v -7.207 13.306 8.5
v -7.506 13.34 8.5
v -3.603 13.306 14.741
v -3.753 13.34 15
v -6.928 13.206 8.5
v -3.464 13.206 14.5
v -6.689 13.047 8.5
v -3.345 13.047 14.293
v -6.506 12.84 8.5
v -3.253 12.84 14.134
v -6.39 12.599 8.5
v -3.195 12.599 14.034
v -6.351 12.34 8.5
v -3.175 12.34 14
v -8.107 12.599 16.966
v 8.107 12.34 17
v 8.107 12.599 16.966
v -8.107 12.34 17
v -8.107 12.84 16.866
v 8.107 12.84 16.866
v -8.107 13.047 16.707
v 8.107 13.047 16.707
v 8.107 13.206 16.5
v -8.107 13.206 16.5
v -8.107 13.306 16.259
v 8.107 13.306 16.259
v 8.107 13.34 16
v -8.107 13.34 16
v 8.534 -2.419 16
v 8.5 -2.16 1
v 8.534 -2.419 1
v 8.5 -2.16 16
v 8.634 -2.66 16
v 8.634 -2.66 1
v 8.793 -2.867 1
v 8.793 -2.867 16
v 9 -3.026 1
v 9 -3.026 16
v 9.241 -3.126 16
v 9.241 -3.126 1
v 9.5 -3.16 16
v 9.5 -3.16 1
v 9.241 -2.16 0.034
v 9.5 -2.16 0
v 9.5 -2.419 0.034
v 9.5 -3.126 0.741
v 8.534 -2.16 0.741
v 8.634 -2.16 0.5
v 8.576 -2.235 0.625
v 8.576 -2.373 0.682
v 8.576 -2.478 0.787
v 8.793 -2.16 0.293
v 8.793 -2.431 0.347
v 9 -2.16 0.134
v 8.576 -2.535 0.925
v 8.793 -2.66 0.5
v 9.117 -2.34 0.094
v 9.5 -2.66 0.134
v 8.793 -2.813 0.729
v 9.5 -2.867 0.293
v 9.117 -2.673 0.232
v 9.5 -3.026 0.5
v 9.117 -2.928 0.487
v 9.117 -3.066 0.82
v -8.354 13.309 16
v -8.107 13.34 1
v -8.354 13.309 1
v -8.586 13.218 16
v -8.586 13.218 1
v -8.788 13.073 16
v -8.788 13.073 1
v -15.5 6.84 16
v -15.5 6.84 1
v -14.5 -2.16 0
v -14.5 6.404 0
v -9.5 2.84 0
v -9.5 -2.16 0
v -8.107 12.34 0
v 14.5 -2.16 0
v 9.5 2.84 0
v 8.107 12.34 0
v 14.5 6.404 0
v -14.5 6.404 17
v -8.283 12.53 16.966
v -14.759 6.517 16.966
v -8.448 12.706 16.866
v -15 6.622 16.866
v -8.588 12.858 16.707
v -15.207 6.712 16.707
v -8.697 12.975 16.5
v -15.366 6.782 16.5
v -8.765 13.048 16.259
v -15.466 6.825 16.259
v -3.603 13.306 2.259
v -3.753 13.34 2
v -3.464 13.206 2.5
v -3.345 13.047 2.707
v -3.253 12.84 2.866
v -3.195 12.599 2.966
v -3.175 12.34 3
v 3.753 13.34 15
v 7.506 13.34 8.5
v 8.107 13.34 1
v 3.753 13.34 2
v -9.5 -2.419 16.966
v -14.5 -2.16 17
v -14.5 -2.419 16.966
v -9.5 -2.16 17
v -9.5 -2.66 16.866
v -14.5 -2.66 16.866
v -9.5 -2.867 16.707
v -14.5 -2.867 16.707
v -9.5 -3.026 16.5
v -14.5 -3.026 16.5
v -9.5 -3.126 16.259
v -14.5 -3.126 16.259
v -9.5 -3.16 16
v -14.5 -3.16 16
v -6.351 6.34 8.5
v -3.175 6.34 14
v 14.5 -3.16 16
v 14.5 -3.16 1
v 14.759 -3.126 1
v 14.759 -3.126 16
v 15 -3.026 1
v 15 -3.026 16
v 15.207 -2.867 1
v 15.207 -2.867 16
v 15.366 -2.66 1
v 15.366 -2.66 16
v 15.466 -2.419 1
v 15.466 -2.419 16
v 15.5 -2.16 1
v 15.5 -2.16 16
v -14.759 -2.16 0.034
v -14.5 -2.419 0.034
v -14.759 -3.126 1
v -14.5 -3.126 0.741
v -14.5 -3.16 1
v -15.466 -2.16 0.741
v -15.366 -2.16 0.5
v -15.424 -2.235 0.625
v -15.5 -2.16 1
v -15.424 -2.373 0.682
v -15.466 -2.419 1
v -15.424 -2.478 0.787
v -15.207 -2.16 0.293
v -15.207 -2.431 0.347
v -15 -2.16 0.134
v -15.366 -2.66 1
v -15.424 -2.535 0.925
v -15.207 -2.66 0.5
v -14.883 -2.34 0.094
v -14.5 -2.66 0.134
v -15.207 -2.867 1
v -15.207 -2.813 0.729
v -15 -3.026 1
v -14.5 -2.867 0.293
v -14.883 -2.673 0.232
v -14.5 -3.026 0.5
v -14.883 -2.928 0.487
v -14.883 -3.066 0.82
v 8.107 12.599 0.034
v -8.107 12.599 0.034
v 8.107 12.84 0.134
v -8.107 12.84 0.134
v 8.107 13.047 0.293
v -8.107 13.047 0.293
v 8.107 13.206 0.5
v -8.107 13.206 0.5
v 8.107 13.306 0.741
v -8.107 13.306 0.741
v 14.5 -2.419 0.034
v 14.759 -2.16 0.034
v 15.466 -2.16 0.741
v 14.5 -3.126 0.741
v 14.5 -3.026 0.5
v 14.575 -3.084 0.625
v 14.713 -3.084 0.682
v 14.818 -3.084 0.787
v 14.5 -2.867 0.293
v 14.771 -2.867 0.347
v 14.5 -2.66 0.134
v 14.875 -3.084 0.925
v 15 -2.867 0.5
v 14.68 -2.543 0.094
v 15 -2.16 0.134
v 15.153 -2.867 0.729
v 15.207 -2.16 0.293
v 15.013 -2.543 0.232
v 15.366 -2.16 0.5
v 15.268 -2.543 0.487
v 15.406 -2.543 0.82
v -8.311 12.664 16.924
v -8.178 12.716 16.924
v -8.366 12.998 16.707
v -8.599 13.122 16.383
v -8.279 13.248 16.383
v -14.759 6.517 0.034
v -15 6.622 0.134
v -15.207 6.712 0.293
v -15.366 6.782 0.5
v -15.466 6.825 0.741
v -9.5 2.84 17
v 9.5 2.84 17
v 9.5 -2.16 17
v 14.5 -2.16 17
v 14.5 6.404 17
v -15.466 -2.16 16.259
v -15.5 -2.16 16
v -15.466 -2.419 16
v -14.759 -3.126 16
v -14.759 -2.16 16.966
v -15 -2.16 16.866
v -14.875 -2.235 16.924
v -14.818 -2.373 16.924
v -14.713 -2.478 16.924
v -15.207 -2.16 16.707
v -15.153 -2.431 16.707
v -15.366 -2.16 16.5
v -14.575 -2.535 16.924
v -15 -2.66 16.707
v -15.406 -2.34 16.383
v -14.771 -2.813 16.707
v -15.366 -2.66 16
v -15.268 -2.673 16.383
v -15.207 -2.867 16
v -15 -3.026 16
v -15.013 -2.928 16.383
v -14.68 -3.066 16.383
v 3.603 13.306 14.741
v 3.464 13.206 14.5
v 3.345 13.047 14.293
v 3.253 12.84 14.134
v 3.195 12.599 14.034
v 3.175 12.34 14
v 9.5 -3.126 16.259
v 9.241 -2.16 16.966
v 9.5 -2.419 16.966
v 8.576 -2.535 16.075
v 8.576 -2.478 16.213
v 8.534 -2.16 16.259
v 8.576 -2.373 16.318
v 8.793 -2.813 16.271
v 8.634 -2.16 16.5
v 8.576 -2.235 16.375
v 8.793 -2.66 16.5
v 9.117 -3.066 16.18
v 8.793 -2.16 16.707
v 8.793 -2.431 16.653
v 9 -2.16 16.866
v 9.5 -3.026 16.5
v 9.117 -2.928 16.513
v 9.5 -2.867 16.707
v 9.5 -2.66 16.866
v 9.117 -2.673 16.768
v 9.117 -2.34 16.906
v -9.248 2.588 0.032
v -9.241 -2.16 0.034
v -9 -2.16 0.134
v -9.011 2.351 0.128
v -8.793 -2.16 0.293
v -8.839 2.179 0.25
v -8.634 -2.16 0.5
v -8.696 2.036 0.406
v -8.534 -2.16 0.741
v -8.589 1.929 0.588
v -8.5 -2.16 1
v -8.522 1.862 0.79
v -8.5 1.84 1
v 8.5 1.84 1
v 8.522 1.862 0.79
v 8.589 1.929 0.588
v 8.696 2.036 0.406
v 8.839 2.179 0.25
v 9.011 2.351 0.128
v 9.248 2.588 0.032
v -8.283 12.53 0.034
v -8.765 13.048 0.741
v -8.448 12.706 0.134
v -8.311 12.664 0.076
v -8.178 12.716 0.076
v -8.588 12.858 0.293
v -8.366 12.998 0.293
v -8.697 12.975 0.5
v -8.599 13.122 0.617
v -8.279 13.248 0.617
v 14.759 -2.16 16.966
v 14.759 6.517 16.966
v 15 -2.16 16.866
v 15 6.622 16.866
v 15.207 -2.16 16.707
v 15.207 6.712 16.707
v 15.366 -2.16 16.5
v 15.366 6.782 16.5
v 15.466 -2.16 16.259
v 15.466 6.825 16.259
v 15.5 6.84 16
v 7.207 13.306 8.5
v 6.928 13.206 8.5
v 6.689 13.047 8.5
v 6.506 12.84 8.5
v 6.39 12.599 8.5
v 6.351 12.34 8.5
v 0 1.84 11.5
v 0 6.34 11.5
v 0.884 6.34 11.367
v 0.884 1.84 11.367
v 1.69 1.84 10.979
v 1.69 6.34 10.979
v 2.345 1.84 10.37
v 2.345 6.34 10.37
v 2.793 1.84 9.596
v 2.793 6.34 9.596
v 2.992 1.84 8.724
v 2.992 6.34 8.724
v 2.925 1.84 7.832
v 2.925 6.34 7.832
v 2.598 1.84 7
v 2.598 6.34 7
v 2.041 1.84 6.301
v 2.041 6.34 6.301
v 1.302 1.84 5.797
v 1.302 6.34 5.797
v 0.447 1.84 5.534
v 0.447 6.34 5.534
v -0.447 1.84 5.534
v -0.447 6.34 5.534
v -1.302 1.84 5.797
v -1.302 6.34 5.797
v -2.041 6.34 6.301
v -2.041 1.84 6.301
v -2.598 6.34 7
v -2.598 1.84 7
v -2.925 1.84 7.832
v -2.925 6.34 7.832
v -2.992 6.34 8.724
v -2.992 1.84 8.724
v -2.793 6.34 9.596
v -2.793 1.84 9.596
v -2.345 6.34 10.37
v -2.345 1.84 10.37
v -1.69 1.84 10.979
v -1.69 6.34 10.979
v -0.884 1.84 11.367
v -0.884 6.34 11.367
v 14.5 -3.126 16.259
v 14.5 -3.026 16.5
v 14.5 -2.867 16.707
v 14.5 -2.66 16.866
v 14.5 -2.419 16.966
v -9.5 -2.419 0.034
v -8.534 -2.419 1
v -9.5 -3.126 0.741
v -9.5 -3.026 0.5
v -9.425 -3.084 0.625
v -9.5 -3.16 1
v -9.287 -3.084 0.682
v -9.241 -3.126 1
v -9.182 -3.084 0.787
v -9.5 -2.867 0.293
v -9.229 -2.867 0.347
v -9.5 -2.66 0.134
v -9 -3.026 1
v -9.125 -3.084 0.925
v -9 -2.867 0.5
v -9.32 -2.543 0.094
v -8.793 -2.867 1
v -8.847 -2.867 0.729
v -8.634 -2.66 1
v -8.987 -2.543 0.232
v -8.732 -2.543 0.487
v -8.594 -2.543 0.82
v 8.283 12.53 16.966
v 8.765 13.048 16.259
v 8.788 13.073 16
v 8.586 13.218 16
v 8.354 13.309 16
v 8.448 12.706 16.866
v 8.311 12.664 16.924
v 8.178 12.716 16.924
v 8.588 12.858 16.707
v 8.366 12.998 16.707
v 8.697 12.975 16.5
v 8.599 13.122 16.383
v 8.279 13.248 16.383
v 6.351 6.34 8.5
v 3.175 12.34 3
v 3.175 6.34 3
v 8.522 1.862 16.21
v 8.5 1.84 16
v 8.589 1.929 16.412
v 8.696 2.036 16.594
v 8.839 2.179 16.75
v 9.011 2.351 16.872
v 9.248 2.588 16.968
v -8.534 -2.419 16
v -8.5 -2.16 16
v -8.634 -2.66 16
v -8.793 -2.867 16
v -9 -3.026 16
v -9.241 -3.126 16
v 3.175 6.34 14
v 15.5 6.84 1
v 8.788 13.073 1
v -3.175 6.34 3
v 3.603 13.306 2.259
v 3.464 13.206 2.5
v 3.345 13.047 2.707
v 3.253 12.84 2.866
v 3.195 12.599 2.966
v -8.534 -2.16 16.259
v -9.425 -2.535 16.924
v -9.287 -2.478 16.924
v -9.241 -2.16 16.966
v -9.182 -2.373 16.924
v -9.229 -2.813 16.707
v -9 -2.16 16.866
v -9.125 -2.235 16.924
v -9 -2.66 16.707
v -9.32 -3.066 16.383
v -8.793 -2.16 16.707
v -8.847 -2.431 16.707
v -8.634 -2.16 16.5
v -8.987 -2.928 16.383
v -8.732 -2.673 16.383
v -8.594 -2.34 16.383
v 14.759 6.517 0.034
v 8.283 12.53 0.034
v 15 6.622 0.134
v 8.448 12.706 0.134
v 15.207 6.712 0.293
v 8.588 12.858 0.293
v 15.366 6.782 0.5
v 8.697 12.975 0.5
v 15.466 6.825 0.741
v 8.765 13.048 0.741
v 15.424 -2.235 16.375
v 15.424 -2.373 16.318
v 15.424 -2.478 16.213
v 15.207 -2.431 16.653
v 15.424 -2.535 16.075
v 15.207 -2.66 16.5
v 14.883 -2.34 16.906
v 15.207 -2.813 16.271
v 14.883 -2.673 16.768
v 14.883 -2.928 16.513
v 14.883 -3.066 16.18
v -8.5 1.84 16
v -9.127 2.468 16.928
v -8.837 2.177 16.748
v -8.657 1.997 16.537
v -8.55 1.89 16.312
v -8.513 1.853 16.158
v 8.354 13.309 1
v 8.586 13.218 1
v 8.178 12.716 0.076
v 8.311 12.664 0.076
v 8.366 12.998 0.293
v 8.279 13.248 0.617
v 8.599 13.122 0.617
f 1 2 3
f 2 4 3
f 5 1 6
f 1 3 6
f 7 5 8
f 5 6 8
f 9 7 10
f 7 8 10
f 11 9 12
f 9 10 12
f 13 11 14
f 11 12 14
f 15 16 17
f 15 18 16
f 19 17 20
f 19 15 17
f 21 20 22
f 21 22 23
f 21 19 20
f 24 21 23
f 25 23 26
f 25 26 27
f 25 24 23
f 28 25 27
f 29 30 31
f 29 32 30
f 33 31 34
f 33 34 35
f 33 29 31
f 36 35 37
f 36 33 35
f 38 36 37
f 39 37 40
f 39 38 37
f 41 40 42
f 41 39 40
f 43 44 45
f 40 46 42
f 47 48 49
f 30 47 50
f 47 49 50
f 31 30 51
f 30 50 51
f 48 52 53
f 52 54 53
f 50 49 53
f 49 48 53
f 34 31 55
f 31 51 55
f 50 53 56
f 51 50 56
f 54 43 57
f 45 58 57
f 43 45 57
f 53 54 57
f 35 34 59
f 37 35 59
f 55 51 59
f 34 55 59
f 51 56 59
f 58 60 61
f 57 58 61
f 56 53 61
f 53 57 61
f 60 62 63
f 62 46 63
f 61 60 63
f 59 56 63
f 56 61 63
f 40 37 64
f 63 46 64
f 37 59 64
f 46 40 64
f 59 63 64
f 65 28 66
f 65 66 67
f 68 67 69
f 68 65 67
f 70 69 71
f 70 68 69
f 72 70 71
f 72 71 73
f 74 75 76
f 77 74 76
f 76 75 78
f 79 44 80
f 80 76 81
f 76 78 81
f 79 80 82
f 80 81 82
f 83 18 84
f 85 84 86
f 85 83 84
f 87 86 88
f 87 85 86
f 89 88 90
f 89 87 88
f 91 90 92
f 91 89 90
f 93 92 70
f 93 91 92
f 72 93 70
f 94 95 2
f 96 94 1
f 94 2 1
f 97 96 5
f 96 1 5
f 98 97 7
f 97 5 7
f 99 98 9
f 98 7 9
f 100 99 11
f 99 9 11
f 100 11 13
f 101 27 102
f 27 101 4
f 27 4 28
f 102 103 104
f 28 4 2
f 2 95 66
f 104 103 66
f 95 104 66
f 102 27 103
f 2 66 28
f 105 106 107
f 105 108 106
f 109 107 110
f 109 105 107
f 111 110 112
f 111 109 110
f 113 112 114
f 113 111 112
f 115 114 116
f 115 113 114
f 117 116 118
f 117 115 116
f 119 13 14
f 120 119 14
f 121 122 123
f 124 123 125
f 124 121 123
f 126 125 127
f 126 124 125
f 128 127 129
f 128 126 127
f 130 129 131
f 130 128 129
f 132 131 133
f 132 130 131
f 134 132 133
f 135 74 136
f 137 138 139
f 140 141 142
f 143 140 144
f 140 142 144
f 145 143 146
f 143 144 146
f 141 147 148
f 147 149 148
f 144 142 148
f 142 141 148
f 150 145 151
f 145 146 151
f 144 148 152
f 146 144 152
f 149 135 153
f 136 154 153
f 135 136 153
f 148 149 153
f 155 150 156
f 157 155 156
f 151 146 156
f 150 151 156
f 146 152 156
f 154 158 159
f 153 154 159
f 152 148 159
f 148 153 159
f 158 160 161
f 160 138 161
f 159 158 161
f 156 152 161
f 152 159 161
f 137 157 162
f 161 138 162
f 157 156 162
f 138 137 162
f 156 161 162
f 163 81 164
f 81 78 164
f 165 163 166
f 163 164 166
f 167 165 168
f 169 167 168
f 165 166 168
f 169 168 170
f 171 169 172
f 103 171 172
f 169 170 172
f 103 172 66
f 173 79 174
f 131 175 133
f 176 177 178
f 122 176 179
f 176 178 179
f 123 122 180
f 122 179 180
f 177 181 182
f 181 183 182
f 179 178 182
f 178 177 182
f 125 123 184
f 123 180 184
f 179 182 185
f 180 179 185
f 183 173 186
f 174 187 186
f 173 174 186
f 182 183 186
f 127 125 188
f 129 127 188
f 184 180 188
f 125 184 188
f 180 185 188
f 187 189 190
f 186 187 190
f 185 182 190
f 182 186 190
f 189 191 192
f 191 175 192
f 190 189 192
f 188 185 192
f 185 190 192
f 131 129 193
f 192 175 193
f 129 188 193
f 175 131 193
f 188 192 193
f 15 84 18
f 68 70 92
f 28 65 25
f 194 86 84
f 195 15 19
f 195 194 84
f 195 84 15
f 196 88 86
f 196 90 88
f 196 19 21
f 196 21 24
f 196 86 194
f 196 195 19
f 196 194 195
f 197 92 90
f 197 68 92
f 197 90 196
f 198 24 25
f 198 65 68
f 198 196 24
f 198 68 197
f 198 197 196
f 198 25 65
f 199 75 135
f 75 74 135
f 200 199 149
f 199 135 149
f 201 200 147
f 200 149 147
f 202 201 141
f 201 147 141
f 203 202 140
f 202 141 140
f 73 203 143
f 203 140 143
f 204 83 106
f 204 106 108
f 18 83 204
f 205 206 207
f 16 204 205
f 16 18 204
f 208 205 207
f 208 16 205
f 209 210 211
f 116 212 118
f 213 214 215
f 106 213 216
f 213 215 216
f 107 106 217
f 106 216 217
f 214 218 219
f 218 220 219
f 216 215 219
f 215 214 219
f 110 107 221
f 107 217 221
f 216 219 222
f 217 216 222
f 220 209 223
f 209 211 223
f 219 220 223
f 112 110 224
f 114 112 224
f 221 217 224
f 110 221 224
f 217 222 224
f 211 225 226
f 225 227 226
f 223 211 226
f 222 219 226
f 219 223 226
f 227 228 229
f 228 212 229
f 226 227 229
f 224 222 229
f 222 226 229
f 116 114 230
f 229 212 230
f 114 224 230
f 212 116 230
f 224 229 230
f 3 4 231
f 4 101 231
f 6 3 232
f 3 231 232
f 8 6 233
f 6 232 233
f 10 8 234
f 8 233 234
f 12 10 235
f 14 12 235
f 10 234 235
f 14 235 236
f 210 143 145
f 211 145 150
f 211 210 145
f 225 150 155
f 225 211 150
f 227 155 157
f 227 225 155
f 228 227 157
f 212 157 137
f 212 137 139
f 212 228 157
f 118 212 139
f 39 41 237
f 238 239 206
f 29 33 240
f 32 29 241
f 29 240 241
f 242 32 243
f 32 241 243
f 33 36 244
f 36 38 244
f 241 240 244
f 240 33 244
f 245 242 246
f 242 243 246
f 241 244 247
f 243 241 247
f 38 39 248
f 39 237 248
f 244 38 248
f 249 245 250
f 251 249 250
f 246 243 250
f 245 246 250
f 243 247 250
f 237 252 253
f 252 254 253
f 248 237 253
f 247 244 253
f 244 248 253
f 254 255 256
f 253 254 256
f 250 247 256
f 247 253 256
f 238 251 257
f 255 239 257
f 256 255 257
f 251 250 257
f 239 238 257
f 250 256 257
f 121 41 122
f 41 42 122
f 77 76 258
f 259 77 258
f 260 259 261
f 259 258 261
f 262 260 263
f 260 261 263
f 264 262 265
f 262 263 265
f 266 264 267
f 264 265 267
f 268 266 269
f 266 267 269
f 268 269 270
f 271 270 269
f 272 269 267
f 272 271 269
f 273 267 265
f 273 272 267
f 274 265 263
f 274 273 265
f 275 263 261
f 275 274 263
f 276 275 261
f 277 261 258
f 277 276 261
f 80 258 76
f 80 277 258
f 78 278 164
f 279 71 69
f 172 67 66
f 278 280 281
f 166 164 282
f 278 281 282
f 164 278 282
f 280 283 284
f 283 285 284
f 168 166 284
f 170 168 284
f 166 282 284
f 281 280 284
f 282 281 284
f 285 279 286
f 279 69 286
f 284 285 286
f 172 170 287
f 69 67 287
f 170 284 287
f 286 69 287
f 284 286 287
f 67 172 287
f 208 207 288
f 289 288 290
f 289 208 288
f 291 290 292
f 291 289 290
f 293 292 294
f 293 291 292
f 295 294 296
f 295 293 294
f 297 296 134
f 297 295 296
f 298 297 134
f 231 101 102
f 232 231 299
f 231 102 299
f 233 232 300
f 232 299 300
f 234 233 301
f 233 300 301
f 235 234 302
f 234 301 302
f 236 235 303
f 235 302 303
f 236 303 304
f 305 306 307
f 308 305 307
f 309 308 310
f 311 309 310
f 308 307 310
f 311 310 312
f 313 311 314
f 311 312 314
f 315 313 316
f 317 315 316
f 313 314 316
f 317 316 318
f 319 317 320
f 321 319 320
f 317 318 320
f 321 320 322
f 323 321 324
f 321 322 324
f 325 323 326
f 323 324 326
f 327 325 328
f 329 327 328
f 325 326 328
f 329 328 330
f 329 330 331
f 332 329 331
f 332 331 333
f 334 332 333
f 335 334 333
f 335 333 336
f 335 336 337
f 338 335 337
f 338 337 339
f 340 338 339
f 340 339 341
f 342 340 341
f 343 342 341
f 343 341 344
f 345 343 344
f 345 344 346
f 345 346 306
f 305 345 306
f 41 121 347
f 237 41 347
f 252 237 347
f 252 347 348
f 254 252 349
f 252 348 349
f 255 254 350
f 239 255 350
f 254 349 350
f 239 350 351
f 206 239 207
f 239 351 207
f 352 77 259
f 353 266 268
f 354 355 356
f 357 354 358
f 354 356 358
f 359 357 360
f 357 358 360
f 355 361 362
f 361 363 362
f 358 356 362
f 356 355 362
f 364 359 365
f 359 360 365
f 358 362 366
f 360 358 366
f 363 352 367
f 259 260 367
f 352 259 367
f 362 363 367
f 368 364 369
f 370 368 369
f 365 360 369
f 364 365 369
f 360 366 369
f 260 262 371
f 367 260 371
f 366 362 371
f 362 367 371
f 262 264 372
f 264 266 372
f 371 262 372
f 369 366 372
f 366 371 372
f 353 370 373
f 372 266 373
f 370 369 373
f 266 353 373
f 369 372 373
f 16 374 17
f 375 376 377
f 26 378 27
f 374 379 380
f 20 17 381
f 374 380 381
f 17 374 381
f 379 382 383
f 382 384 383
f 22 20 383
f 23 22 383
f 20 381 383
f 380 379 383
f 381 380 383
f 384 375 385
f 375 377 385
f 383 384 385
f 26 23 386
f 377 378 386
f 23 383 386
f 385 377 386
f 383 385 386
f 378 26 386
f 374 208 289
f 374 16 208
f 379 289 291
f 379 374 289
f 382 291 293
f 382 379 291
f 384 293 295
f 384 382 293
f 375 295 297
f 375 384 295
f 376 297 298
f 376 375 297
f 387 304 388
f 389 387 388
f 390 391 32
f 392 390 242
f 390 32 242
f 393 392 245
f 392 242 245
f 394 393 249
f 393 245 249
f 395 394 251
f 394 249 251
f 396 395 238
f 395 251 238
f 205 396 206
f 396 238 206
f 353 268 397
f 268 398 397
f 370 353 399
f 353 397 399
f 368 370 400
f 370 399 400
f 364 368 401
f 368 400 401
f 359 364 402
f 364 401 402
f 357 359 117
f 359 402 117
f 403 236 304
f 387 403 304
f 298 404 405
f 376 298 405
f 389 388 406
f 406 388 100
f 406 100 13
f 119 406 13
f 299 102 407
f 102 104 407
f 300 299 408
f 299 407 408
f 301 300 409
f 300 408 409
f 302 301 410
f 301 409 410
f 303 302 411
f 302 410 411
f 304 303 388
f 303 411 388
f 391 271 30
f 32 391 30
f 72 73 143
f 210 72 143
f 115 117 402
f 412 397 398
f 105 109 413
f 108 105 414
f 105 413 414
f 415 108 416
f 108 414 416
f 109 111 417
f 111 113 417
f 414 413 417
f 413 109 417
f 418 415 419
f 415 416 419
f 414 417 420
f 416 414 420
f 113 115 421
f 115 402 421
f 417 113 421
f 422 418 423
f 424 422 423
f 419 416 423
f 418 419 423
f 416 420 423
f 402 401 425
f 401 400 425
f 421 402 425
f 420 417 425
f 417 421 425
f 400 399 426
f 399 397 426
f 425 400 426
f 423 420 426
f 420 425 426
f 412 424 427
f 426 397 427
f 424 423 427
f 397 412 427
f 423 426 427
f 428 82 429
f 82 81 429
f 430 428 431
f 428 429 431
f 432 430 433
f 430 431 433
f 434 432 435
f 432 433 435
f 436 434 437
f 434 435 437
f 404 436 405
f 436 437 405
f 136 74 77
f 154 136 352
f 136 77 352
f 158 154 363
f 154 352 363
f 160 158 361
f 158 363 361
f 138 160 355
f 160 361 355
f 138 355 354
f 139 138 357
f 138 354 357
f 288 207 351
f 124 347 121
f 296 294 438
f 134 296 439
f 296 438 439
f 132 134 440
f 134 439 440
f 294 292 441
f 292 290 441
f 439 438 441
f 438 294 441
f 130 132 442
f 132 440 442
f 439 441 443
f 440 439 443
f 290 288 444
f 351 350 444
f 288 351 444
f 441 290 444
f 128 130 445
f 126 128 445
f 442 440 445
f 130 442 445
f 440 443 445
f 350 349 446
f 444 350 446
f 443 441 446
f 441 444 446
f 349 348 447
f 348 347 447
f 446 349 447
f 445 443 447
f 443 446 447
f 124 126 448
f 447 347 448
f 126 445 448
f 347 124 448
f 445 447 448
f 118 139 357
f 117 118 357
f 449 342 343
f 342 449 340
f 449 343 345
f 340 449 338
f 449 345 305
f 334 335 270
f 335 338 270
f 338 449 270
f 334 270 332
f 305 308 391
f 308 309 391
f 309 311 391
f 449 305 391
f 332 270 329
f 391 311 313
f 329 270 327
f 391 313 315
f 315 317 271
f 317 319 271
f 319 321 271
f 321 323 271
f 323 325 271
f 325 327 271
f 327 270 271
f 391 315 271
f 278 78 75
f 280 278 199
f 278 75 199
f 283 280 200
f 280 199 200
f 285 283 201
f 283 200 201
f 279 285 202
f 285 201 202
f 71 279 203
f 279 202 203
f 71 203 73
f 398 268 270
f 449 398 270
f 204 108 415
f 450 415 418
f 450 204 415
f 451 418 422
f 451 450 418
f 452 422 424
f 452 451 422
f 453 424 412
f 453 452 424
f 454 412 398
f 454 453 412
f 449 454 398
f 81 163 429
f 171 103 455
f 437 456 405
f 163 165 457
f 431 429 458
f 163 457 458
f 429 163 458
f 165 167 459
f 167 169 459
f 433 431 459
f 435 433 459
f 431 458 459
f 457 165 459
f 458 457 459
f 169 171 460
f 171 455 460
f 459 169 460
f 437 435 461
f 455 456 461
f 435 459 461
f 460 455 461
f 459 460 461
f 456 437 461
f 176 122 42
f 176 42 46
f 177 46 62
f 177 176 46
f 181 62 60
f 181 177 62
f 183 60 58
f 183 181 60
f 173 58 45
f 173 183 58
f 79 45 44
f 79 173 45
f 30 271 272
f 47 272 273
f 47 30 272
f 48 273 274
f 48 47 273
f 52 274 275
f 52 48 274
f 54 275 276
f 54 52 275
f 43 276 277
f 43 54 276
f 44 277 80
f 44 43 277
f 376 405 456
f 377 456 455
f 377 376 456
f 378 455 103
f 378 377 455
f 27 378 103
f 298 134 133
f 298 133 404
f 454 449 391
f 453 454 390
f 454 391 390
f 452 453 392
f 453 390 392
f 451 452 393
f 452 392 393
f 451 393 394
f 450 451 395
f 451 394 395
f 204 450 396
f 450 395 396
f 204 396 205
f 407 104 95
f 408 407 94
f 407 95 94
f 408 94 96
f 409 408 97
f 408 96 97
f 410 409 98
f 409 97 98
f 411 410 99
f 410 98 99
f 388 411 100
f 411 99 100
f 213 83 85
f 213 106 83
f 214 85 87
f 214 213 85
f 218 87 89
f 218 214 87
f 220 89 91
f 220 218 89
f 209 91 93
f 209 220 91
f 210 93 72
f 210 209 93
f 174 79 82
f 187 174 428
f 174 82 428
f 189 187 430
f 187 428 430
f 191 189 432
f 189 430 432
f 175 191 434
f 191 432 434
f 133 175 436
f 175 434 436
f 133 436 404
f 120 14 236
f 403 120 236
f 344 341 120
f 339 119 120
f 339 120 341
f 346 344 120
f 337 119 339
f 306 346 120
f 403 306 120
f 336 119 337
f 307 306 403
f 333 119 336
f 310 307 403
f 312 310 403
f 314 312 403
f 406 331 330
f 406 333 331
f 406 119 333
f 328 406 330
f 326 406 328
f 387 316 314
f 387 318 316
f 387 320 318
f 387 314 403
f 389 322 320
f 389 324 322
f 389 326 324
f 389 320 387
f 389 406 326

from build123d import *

# Parameters (mm, degrees)
BOSS_EXTRU_1_DEPTH      = 17
ENL_V_MAT_EXTRU_1_DEPTH = 7
ESQUISSE3_R             = 3
ENL_V_MAT_EXTRU_2_DEPTH = 5
CONG_1_R                = 1


with BuildPart() as part:
    # Esquisse1 → Boss.-Extru.1 (new body)
    with BuildSketch(Plane.XY):
        Polygon((-3, 1.840029022), (3, 1.840029022), (8.5, 1.840029022), (8.5, -3.159970978), (15.5, -3.159970978), (15.5, 6.840029022), (8.5, 13.340029022), (-8.5, 13.340029022), (-15.5, 6.840029022), (-15.5, -3.159970978), (-8.5, -3.159970978), (-8.5, 1.840029022), align=None)
    extrude(amount=BOSS_EXTRU_1_DEPTH)

    # Esquisse2 → Enlèv. mat.-Extru.1 (cut)
    with BuildSketch(Plane(origin=(0, 13.340029022, 0), x_dir=(1, 0, 0), z_dir=(0, 1, 0))):
        Polygon((6.350852961, -8.5), (3.175426481, -3), (-3.175426481, -3), (-6.350852961, -8.5), (-3.175426481, -14), (3.175426481, -14), align=None)
    extrude(amount=-ENL_V_MAT_EXTRU_1_DEPTH, mode=Mode.SUBTRACT)

    # Esquisse3 → Enlèv. mat.-Extru.2 (cut)
    with BuildSketch(Plane(origin=(0, 6.340029022, 0), x_dir=(1, 0, 0), z_dir=(0, 1, 0))):
        with Locations(Location((0, -8.5, 0), (0, 0, 270))):
            Circle(ESQUISSE3_R)
    extrude(amount=-ENL_V_MAT_EXTRU_2_DEPTH, mode=Mode.SUBTRACT)

    # Congé1
    cong_1_edges = [part.edges().sort_by_distance(p)[0] for p in [
        (12, -3.159970978, 17),
        (0, 1.840029022, 0),
        (-8.5, -0.659970978, 0),
        (-12, -3.159970978, 0),
        (-15.5, 1.840029022, 0),
        (-12, 10.090029022, 0),
        (15.5, 1.840029022, 17),
        (0, 13.340029022, 0),
        (12, 10.090029022, 0),
        (15.5, 1.840029022, 0),
        (12, -3.159970978, 0),
        (8.5, -0.659970978, 0),
        (12, 10.090029022, 17),
        (0, 13.340029022, 17),
        (-8.5, -3.159970978, 8.5),
        (-15.5, -3.159970978, 8.5),
        (-8.5, 13.340029022, 8.5),
        (8.5, 13.340029022, 8.5),
        (15.5, -3.159970978, 8.5),
        (8.5, -3.159970978, 8.5),
        (-12, 10.090029022, 17),
        (-15.5, 1.840029022, 17),
        (-12, -3.159970978, 17),
        (-8.5, -0.659970978, 17),
        (0, 1.840029022, 17),
        (4.763139721, 13.340029022, 11.25),
        (4.763139721, 13.340029022, 5.75),
        (0, 13.340029022, 3),
        (-4.763139721, 13.340029022, 5.75),
        (-4.763139721, 13.340029022, 11.25),
        (0, 13.340029022, 14),
        (8.5, -0.659970978, 17),
    ]]
    fillet(cong_1_edges, radius=CONG_1_R)


solid = part.part
